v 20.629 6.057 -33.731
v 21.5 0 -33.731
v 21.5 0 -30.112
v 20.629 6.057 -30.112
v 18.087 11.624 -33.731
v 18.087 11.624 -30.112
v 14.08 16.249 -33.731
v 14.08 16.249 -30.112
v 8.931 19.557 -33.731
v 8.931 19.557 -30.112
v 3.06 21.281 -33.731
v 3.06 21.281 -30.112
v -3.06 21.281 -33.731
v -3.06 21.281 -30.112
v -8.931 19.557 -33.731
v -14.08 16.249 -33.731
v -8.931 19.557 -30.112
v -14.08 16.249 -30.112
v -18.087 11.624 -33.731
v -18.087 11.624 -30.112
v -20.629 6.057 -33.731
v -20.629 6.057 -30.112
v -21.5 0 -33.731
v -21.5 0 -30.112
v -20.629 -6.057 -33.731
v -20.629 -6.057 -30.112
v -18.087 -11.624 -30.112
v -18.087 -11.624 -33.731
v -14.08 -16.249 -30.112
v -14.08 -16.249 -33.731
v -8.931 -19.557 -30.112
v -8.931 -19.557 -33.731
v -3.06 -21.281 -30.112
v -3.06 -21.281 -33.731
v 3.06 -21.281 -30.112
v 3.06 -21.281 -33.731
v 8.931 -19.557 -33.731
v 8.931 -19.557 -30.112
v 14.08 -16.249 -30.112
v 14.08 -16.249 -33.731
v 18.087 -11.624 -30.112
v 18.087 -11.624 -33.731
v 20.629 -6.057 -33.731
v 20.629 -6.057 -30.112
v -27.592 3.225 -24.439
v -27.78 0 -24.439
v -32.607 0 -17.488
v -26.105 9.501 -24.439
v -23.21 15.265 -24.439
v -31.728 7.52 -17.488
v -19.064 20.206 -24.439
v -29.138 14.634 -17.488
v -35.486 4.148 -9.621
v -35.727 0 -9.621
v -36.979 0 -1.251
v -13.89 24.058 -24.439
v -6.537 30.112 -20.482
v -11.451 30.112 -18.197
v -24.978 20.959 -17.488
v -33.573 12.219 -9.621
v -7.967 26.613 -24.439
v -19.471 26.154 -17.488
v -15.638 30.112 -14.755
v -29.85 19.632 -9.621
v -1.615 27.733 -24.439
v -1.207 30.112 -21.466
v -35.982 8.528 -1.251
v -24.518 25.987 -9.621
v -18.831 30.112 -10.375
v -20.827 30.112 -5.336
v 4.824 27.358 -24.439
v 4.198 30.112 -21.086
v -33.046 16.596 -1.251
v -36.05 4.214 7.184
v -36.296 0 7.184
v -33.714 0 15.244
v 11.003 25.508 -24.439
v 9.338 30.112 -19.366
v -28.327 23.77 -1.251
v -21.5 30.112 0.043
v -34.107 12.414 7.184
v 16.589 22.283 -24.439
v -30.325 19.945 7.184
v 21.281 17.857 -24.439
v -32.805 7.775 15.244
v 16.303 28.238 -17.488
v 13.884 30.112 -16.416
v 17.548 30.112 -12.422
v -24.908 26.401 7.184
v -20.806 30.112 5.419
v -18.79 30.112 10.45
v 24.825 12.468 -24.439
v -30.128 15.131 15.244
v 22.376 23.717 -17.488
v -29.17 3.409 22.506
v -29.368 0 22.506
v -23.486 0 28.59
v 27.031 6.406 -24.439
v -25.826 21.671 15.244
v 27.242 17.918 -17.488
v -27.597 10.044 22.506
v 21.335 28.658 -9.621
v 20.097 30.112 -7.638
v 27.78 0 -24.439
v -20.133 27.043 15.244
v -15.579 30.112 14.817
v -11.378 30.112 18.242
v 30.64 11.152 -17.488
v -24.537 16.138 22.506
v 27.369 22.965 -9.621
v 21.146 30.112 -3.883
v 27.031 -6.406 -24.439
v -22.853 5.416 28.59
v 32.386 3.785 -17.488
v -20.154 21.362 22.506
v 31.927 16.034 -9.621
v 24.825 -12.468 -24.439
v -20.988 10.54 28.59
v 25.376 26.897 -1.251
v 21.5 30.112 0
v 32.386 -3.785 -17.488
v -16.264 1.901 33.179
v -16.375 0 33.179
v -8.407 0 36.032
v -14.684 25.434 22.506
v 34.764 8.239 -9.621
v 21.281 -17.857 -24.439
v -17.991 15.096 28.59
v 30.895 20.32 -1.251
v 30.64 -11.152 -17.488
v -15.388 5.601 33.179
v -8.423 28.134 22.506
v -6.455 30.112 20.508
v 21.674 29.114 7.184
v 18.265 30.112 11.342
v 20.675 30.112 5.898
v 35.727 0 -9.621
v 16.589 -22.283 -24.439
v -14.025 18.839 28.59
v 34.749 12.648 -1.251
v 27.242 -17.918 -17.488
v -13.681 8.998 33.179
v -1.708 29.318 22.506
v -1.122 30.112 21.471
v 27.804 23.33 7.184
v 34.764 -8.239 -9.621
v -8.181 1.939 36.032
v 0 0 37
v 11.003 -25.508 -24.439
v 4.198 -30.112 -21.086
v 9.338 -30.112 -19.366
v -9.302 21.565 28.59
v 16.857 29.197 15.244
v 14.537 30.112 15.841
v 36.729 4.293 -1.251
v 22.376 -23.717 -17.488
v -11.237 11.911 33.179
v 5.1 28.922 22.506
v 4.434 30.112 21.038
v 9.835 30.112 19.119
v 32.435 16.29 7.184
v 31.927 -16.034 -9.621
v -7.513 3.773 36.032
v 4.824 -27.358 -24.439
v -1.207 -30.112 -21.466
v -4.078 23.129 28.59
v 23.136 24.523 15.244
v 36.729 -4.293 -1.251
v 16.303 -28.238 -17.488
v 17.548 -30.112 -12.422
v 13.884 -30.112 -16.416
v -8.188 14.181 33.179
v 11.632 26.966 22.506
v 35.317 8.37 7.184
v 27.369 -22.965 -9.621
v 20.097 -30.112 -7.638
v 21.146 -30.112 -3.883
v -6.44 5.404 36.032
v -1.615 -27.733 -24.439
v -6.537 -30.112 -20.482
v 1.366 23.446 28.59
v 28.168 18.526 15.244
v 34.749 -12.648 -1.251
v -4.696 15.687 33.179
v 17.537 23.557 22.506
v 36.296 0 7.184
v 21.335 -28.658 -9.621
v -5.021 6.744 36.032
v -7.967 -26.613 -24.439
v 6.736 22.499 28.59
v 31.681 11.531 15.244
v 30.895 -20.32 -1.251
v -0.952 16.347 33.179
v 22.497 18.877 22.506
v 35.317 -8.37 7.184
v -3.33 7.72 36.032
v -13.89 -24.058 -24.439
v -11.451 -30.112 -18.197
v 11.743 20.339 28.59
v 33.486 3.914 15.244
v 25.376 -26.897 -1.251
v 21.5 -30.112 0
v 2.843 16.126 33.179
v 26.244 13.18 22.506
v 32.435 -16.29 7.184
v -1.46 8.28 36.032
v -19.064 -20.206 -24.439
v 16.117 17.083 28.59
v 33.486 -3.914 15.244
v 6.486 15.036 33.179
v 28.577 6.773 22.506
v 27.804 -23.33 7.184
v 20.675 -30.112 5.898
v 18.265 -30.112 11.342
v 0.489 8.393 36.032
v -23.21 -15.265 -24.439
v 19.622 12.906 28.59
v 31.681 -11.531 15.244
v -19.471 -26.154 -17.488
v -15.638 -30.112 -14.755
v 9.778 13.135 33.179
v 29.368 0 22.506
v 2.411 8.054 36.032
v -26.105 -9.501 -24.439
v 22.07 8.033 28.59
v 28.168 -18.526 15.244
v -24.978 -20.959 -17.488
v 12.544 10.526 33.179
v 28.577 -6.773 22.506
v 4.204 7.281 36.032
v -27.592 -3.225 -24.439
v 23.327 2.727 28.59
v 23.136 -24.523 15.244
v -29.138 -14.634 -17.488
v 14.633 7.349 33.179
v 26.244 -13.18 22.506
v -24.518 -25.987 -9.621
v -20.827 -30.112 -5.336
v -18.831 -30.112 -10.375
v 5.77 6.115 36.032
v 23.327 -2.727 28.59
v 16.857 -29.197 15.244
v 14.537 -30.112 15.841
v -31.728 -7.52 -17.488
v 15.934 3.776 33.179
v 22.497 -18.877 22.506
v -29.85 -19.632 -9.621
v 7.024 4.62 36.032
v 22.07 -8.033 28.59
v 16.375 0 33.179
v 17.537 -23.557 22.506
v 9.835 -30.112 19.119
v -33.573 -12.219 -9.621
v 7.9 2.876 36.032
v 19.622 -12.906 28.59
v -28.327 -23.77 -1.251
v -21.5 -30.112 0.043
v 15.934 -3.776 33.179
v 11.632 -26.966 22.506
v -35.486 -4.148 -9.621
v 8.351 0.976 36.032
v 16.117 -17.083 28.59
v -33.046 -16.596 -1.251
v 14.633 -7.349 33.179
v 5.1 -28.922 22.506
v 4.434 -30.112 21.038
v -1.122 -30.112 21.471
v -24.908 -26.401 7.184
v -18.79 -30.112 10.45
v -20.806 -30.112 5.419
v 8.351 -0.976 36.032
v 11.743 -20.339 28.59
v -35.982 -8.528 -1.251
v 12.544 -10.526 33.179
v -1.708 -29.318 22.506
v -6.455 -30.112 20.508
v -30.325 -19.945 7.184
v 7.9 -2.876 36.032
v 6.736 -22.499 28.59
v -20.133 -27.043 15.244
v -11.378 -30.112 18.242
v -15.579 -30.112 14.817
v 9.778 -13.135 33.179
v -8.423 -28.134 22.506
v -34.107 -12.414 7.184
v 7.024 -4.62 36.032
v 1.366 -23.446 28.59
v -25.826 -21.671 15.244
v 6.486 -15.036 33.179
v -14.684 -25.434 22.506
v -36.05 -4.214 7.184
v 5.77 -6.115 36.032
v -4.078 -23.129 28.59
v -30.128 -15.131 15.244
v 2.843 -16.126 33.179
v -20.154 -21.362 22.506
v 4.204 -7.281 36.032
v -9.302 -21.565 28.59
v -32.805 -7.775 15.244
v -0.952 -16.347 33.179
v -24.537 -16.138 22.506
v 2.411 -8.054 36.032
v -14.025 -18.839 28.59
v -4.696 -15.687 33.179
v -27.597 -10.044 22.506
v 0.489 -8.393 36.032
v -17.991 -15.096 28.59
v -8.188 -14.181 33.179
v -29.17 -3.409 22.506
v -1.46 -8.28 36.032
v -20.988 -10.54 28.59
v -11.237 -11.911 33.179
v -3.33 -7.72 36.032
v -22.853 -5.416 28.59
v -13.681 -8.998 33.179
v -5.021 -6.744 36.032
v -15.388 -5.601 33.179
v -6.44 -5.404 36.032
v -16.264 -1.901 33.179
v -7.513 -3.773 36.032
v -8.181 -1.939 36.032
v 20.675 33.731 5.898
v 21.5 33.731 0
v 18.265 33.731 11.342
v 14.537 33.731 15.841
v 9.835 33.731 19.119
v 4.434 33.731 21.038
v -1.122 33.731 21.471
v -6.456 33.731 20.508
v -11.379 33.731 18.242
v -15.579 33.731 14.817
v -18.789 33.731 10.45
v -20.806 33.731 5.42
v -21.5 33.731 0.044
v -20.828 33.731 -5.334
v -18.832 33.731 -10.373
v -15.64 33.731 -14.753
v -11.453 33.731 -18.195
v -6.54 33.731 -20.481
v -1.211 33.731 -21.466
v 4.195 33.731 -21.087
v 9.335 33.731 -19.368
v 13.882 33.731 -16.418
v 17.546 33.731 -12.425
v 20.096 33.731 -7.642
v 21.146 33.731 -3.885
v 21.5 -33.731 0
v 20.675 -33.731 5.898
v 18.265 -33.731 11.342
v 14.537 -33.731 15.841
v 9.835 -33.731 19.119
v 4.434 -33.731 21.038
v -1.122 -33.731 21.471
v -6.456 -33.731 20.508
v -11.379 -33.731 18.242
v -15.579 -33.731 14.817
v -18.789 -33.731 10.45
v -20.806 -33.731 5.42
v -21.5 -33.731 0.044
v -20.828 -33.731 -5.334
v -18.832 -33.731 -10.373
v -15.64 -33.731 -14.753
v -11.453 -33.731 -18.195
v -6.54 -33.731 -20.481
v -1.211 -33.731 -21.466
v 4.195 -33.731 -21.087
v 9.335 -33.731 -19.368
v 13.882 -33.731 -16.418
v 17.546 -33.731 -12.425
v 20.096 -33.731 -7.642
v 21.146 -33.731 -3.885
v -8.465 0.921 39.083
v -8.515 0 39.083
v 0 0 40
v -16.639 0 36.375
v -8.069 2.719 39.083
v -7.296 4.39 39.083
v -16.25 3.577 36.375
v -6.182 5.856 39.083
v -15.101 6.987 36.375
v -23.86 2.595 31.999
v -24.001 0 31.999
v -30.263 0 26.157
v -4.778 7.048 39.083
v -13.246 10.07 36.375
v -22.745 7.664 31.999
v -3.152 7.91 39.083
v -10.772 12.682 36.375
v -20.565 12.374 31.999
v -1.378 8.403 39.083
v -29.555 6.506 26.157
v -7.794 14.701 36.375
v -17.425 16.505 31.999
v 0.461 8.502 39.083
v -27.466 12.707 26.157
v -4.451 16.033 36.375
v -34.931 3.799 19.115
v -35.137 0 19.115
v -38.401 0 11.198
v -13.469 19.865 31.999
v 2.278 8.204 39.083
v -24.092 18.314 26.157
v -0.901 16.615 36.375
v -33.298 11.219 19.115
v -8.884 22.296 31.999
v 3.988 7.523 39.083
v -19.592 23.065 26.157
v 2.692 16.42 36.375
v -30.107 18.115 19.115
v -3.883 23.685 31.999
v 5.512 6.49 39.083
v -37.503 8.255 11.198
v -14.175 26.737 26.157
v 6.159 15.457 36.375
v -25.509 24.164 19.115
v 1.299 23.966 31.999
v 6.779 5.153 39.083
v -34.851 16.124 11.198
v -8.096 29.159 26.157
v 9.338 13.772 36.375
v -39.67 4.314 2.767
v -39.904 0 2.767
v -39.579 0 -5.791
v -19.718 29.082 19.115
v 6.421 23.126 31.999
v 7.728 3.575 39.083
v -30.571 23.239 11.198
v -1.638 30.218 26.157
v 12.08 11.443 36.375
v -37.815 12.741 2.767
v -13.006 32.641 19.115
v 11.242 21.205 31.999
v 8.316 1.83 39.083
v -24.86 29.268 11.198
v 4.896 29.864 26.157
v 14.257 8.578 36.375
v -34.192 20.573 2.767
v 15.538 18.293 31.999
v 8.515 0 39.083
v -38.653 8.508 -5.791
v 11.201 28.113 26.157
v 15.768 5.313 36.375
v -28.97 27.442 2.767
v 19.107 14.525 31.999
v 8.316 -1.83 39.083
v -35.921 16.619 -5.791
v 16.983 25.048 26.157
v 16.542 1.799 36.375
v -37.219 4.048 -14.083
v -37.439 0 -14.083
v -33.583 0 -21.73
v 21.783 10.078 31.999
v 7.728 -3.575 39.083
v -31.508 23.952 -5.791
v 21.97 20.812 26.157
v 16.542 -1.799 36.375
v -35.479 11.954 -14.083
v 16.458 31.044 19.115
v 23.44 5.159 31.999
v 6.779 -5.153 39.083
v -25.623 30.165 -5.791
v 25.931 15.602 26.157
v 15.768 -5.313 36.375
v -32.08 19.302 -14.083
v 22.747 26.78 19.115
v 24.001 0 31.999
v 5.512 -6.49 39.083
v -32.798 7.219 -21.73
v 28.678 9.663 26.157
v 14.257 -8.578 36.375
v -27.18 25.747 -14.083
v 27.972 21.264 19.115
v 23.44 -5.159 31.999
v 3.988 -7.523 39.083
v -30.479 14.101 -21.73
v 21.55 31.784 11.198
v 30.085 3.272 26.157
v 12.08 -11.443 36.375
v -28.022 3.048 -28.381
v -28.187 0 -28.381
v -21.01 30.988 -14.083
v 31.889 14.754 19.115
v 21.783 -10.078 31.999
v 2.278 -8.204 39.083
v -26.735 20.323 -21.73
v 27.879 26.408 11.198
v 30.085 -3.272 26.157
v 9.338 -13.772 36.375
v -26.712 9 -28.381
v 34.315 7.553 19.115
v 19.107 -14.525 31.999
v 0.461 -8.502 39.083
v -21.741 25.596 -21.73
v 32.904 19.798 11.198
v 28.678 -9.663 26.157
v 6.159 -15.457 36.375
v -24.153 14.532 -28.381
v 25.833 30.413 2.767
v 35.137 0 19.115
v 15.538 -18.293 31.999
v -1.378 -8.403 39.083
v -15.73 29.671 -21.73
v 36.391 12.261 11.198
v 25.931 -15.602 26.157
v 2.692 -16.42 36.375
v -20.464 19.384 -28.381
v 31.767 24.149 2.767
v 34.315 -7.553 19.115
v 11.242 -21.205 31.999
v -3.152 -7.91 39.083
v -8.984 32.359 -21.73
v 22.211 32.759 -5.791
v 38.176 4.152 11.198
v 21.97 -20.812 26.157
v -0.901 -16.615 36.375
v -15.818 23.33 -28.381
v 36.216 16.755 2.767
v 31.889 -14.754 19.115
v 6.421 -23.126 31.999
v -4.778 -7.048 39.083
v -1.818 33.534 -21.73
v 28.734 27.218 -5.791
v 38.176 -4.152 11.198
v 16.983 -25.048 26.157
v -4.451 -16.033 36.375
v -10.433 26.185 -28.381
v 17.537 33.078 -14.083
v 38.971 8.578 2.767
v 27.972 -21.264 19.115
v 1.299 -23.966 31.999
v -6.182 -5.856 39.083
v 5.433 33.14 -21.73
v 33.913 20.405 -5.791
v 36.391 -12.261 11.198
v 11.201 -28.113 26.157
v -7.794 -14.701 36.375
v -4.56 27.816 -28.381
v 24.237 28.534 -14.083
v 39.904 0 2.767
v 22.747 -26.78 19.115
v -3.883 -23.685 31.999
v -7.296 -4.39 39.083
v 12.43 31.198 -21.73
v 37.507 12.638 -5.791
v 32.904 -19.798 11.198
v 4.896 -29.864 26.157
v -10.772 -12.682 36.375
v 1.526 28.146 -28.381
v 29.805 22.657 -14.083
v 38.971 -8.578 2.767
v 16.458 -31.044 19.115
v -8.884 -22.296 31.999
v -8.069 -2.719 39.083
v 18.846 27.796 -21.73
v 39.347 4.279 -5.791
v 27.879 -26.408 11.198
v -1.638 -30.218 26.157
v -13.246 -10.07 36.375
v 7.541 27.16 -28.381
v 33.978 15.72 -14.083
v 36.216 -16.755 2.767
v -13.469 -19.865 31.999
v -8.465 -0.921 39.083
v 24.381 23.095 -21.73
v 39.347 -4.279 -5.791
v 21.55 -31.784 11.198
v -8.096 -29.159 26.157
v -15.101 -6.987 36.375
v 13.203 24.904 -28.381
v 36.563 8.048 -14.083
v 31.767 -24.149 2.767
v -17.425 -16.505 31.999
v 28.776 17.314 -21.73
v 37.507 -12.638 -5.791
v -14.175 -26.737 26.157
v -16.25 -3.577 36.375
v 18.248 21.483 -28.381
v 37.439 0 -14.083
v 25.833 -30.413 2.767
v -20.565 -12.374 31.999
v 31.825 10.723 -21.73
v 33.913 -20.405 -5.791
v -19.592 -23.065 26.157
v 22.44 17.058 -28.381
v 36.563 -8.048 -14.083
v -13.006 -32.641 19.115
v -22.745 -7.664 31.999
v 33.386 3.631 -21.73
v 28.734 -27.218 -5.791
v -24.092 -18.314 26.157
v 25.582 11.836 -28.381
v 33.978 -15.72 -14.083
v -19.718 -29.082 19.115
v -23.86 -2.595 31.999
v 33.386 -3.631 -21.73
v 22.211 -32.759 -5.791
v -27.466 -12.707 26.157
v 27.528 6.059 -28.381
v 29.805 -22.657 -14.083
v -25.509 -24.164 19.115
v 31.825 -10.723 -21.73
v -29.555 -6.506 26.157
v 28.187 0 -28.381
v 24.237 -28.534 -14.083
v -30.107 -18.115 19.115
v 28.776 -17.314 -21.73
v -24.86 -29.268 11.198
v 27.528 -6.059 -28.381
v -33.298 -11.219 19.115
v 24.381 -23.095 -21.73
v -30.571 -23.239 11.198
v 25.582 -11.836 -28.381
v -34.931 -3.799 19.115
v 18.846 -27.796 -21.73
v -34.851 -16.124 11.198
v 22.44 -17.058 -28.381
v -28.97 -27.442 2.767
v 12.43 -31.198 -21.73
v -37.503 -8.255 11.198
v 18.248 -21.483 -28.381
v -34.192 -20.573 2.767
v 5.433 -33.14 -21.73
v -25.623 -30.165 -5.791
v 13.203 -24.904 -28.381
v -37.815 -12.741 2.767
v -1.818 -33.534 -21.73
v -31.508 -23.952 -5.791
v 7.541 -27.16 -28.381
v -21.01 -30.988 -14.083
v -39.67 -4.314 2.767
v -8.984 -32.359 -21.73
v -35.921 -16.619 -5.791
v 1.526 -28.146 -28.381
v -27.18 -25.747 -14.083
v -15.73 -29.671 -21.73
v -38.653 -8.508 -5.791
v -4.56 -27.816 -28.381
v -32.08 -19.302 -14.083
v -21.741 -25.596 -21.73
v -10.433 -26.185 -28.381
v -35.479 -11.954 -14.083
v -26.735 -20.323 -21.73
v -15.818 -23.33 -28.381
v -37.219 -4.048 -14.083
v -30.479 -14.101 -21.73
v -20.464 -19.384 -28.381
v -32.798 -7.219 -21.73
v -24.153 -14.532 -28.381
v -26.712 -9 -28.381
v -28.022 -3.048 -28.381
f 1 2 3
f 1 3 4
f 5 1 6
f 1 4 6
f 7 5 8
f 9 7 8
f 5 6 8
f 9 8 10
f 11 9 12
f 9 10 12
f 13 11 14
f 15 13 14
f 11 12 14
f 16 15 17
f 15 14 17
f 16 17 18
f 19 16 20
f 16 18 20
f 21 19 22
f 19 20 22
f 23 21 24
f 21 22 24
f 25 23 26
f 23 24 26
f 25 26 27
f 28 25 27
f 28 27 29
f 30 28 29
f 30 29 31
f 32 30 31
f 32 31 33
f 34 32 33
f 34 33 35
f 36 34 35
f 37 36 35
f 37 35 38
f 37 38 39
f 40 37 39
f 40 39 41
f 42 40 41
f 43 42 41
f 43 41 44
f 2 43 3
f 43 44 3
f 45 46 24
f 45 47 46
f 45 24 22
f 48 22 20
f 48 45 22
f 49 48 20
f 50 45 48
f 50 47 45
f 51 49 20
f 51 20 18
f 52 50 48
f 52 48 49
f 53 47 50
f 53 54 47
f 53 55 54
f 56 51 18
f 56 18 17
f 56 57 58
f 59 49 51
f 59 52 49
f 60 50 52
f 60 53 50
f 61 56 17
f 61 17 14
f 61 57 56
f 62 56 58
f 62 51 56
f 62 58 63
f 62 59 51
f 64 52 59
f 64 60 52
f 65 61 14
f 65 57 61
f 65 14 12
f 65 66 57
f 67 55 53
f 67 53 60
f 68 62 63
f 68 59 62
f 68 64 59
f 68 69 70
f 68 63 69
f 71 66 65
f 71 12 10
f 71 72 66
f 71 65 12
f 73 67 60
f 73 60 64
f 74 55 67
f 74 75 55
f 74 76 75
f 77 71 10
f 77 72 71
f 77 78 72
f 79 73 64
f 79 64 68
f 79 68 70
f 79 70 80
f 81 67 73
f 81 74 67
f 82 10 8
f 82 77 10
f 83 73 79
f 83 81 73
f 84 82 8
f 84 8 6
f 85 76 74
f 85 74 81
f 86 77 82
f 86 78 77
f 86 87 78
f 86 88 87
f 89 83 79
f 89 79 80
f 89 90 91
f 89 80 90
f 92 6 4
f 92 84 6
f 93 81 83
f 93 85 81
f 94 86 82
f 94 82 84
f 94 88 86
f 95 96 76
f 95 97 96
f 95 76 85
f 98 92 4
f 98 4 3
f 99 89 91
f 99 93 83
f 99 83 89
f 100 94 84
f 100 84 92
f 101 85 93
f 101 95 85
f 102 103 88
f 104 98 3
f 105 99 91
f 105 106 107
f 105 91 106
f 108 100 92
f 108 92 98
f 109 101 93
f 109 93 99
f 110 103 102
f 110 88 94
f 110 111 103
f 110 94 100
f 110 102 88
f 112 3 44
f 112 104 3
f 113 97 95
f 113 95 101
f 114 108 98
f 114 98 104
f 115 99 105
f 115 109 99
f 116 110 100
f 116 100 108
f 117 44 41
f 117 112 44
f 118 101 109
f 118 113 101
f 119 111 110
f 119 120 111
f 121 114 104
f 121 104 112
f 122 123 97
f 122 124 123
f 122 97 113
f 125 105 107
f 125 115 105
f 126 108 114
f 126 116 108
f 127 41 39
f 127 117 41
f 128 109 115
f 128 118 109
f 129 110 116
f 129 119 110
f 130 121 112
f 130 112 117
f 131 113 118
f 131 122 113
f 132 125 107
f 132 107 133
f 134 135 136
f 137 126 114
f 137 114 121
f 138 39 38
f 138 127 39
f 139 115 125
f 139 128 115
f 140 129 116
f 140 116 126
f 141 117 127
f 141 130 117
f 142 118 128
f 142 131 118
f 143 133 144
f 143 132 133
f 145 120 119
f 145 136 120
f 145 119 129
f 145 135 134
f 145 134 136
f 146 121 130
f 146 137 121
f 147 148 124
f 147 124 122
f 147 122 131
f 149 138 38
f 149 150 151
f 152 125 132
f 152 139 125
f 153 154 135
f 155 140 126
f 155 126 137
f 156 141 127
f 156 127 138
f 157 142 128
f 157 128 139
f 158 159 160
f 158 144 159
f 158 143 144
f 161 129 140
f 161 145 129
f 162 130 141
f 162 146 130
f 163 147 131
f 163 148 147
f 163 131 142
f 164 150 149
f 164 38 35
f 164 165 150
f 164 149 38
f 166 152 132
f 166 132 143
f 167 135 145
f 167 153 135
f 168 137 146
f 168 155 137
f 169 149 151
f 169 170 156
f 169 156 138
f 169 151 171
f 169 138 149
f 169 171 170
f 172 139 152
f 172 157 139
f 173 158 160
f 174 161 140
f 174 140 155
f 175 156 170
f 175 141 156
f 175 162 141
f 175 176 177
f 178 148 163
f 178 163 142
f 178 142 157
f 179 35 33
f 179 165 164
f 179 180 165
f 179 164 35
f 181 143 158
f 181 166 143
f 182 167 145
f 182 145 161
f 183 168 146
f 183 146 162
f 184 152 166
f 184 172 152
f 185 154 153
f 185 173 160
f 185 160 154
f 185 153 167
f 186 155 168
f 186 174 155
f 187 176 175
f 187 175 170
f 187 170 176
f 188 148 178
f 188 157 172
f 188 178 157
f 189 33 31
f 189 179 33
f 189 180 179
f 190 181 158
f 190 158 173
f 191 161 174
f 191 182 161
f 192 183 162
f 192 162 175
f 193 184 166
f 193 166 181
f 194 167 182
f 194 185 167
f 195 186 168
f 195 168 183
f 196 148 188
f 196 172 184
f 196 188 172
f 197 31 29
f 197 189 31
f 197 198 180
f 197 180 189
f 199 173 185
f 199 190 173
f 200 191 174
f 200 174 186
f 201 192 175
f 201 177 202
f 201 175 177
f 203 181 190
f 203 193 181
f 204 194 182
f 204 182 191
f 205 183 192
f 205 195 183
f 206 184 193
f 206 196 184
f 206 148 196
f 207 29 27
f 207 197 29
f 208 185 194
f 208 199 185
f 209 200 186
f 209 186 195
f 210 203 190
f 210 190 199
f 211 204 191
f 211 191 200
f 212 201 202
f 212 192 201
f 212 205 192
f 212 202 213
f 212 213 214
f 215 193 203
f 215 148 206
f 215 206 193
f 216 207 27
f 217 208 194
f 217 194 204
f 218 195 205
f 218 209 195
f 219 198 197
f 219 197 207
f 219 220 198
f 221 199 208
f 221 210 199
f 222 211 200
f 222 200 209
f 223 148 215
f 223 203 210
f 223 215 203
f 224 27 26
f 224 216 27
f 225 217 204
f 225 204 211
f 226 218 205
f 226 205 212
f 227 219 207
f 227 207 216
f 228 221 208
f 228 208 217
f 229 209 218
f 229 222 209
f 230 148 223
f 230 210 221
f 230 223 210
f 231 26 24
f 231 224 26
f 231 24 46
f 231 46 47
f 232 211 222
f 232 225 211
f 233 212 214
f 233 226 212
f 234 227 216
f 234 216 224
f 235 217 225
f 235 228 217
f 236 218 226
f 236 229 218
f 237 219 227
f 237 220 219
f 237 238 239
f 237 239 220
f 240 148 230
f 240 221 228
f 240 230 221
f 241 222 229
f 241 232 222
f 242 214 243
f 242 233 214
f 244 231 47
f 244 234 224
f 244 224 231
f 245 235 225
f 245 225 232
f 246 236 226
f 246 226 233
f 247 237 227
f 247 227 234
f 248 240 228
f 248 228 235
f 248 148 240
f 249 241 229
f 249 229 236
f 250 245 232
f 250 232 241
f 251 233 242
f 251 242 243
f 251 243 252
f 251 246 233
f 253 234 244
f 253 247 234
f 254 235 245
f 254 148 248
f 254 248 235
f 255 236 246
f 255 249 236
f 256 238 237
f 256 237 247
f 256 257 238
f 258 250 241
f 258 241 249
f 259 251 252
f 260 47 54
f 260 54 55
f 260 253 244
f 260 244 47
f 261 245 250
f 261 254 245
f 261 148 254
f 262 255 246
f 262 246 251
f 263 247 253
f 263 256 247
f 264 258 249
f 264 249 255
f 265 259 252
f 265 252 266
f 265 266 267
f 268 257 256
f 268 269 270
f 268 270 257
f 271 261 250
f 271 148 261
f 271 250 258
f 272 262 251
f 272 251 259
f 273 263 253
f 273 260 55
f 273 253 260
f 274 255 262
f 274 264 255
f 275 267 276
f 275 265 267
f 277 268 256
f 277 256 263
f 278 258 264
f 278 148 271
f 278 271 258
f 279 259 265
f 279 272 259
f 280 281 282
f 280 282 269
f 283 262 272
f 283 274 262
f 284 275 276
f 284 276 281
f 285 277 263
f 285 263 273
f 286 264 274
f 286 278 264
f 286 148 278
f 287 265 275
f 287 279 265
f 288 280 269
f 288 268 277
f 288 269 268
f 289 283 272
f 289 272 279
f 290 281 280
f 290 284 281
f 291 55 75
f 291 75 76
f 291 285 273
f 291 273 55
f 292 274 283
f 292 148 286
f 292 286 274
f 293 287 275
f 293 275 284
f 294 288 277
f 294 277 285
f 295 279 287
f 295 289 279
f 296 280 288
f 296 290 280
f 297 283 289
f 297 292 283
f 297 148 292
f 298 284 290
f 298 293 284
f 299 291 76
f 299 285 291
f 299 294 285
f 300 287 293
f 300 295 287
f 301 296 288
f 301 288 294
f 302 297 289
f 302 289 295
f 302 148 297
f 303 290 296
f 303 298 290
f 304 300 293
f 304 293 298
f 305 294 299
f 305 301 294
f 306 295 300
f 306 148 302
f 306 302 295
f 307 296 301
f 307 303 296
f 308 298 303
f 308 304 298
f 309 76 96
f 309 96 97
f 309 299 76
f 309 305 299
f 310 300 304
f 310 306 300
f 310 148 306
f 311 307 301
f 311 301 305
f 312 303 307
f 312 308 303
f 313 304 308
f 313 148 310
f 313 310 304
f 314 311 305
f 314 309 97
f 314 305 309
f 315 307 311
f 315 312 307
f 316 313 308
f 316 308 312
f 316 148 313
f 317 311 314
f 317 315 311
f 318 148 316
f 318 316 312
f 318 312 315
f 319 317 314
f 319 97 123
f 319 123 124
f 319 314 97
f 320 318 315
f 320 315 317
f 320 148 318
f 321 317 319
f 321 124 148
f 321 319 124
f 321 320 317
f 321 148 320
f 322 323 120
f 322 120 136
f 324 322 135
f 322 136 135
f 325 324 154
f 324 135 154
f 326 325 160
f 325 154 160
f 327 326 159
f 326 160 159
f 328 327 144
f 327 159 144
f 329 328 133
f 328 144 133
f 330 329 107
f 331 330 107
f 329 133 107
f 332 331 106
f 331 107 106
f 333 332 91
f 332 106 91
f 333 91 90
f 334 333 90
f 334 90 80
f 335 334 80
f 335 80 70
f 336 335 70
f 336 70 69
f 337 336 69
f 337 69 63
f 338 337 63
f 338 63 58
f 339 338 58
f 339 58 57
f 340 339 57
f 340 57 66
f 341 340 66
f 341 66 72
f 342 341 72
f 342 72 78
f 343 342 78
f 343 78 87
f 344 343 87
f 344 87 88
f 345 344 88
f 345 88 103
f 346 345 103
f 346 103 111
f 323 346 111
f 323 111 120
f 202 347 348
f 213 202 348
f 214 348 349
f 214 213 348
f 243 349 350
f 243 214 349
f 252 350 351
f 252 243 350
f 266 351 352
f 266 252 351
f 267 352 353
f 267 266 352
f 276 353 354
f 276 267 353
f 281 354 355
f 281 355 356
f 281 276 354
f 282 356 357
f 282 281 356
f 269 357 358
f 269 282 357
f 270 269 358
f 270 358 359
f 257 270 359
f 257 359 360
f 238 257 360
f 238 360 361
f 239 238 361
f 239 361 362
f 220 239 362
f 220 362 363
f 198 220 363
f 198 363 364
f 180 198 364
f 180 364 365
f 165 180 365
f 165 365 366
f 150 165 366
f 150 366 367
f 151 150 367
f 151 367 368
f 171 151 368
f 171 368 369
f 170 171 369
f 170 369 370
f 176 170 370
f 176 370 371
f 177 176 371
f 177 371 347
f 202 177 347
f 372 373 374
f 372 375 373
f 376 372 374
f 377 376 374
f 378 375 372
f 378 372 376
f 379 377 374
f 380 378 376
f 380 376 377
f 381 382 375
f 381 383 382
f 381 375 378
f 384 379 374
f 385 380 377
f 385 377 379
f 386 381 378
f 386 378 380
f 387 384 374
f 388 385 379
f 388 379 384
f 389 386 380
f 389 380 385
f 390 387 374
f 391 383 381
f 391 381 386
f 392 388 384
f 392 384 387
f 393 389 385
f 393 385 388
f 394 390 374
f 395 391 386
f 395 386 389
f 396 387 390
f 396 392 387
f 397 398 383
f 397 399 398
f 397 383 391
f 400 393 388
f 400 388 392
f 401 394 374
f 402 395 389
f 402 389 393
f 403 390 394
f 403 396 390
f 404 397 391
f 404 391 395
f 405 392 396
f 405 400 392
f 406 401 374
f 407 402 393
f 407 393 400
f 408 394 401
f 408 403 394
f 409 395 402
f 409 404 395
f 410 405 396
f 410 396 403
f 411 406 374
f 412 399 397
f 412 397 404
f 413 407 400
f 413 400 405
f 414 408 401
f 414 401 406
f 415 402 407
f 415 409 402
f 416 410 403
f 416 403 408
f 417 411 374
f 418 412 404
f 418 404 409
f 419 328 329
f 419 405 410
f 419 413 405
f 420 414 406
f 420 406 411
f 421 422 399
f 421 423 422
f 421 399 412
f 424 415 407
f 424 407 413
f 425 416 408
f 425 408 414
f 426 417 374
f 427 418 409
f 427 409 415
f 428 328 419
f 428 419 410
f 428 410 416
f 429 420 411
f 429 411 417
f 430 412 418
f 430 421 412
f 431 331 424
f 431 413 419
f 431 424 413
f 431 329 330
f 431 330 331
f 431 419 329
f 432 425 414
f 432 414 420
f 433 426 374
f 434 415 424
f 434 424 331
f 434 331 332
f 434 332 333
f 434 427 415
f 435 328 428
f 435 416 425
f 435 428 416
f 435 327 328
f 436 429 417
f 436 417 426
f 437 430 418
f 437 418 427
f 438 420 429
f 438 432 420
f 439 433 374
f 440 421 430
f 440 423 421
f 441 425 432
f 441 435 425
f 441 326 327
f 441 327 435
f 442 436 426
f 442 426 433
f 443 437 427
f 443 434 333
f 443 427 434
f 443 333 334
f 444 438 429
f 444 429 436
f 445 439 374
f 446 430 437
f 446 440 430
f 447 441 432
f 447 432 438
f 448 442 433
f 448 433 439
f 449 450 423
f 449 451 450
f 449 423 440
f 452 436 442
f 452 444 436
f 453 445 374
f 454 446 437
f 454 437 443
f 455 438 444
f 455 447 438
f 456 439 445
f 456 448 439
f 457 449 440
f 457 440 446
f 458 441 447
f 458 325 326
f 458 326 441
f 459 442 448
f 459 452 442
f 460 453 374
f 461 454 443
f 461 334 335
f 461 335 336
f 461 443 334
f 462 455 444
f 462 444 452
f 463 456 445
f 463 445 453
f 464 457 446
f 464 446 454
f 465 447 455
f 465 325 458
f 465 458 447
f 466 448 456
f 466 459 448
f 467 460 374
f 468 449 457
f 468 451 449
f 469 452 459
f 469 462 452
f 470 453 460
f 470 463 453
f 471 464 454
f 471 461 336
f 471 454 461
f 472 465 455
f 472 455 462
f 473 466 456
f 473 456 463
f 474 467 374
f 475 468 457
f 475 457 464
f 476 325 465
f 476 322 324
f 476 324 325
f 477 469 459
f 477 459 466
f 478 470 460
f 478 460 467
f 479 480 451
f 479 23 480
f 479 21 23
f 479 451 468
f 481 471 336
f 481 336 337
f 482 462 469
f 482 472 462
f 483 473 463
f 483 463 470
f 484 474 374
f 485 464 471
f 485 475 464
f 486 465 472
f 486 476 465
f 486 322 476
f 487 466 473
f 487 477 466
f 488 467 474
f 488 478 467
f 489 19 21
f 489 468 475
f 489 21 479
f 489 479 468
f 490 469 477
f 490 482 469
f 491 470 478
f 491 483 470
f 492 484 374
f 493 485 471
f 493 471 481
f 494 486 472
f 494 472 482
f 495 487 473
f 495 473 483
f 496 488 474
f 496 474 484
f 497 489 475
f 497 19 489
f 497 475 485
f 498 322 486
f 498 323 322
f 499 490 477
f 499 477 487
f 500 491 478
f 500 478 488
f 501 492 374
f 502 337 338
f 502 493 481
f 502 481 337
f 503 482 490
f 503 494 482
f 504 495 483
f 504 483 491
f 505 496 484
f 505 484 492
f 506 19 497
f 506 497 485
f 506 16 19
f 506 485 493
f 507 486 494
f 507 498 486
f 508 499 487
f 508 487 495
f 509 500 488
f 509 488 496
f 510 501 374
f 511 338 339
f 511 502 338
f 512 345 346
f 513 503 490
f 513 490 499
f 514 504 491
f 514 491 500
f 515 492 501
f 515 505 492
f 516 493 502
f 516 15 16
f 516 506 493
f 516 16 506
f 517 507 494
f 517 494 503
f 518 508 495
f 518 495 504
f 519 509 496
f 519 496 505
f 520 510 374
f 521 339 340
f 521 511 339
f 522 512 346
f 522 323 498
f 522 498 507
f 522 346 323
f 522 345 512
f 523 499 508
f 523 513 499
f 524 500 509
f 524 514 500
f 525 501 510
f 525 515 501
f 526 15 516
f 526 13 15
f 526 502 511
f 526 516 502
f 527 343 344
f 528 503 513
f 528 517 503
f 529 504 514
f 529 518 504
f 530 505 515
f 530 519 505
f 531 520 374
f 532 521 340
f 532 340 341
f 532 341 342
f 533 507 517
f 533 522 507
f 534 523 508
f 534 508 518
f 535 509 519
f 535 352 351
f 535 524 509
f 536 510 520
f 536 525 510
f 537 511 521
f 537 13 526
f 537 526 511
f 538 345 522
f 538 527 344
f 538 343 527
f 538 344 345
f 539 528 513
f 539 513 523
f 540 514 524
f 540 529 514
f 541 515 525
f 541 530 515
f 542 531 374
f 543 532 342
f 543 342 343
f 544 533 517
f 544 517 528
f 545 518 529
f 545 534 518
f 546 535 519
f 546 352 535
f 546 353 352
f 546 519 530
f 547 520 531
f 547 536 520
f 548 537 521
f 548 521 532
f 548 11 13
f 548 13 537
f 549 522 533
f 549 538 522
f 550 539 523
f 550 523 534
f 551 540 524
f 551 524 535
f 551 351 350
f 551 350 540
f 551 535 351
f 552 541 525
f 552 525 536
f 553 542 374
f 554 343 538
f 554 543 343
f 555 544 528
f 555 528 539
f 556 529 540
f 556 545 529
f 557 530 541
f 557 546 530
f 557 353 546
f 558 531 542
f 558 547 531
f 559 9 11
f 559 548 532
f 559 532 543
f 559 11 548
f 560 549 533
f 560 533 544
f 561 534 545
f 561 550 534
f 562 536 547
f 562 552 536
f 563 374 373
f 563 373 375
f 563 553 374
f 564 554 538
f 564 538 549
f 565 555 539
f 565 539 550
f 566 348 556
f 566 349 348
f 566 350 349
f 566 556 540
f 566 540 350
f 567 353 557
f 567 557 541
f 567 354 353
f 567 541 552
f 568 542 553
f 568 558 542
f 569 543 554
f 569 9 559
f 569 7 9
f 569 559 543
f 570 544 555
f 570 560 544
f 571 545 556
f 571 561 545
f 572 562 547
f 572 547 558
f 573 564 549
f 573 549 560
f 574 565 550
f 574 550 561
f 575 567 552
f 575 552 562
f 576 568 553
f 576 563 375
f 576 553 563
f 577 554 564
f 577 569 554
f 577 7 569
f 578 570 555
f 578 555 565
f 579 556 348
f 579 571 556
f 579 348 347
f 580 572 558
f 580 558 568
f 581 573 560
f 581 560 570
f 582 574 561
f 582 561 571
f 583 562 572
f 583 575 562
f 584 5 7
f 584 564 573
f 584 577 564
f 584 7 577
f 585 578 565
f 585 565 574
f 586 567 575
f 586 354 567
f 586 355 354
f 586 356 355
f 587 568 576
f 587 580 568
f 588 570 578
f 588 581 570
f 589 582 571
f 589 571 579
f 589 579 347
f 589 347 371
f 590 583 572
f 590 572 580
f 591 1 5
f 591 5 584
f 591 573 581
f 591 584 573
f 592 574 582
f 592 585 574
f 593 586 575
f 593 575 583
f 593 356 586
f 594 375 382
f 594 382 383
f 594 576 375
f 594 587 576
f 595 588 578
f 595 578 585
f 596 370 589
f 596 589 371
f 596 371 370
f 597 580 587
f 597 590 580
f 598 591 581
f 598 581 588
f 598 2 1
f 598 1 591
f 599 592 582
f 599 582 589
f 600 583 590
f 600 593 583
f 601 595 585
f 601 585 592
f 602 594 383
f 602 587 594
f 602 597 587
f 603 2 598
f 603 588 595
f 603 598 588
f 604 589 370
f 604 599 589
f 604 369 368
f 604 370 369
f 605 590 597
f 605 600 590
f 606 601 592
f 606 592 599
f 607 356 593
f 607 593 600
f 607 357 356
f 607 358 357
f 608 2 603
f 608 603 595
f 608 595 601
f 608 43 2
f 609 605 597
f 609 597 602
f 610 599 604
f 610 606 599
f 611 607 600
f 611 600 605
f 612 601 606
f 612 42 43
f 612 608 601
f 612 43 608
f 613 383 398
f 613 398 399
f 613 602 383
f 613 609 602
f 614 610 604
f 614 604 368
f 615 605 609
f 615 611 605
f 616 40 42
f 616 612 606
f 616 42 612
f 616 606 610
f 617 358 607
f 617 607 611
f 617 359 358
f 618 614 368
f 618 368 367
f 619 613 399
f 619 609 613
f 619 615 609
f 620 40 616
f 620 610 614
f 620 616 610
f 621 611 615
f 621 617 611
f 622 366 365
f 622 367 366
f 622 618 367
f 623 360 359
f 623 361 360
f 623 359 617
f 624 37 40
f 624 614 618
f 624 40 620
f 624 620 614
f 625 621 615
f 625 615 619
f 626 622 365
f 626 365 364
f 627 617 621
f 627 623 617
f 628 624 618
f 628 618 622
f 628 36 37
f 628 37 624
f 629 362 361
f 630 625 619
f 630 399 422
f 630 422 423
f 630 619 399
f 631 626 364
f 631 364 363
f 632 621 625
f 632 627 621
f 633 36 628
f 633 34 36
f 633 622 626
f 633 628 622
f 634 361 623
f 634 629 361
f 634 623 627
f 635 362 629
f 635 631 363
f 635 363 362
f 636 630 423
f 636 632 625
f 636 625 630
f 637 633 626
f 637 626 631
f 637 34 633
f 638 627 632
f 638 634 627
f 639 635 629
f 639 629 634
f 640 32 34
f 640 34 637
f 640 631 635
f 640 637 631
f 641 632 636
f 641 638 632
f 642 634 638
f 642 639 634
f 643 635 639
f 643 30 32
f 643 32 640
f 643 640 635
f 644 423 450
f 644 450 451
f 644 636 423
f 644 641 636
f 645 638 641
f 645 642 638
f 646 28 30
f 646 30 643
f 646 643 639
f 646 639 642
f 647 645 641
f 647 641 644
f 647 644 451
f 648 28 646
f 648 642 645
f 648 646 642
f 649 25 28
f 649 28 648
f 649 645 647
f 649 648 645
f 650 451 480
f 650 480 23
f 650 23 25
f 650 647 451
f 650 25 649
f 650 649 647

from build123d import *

# Parameters (mm, degrees)
F2_R          = 21.5
F3_DEPTH      = 40.001
F3_DEPTH_BACK = 40.001
F4_R          = 21.5
F5_DEPTH      = 40.001


with BuildPart() as f1:
    # F0 (on Front) → F1 (revolve)
    with BuildSketch(Plane.XZ):
        with BuildLine():
            Line((0, 37), (0, 40))
            ThreePointArc((0, 40), (-40, 0), (0, -40))
            Line((0, -40), (0, -37))
            ThreePointArc((0, -37), (-37, 0), (0, 37))
        make_face()
    revolve(axis=Axis((0, 0, -38.5), (0, 0, -1)))

    # F2 (on Front) → F3 (cut, two sides)
    with BuildSketch(Plane.XZ) as f3_sk:
        Circle(F2_R)
    extrude(amount=F3_DEPTH, mode=Mode.SUBTRACT)
    extrude(f3_sk.sketch, amount=-F3_DEPTH_BACK, mode=Mode.SUBTRACT)

    # F4 (on Top) → F5 (cut, through all)
    with BuildSketch(Plane.XY):
        Circle(F4_R)
    extrude(amount=-F5_DEPTH, mode=Mode.SUBTRACT)


solid = f1.part
